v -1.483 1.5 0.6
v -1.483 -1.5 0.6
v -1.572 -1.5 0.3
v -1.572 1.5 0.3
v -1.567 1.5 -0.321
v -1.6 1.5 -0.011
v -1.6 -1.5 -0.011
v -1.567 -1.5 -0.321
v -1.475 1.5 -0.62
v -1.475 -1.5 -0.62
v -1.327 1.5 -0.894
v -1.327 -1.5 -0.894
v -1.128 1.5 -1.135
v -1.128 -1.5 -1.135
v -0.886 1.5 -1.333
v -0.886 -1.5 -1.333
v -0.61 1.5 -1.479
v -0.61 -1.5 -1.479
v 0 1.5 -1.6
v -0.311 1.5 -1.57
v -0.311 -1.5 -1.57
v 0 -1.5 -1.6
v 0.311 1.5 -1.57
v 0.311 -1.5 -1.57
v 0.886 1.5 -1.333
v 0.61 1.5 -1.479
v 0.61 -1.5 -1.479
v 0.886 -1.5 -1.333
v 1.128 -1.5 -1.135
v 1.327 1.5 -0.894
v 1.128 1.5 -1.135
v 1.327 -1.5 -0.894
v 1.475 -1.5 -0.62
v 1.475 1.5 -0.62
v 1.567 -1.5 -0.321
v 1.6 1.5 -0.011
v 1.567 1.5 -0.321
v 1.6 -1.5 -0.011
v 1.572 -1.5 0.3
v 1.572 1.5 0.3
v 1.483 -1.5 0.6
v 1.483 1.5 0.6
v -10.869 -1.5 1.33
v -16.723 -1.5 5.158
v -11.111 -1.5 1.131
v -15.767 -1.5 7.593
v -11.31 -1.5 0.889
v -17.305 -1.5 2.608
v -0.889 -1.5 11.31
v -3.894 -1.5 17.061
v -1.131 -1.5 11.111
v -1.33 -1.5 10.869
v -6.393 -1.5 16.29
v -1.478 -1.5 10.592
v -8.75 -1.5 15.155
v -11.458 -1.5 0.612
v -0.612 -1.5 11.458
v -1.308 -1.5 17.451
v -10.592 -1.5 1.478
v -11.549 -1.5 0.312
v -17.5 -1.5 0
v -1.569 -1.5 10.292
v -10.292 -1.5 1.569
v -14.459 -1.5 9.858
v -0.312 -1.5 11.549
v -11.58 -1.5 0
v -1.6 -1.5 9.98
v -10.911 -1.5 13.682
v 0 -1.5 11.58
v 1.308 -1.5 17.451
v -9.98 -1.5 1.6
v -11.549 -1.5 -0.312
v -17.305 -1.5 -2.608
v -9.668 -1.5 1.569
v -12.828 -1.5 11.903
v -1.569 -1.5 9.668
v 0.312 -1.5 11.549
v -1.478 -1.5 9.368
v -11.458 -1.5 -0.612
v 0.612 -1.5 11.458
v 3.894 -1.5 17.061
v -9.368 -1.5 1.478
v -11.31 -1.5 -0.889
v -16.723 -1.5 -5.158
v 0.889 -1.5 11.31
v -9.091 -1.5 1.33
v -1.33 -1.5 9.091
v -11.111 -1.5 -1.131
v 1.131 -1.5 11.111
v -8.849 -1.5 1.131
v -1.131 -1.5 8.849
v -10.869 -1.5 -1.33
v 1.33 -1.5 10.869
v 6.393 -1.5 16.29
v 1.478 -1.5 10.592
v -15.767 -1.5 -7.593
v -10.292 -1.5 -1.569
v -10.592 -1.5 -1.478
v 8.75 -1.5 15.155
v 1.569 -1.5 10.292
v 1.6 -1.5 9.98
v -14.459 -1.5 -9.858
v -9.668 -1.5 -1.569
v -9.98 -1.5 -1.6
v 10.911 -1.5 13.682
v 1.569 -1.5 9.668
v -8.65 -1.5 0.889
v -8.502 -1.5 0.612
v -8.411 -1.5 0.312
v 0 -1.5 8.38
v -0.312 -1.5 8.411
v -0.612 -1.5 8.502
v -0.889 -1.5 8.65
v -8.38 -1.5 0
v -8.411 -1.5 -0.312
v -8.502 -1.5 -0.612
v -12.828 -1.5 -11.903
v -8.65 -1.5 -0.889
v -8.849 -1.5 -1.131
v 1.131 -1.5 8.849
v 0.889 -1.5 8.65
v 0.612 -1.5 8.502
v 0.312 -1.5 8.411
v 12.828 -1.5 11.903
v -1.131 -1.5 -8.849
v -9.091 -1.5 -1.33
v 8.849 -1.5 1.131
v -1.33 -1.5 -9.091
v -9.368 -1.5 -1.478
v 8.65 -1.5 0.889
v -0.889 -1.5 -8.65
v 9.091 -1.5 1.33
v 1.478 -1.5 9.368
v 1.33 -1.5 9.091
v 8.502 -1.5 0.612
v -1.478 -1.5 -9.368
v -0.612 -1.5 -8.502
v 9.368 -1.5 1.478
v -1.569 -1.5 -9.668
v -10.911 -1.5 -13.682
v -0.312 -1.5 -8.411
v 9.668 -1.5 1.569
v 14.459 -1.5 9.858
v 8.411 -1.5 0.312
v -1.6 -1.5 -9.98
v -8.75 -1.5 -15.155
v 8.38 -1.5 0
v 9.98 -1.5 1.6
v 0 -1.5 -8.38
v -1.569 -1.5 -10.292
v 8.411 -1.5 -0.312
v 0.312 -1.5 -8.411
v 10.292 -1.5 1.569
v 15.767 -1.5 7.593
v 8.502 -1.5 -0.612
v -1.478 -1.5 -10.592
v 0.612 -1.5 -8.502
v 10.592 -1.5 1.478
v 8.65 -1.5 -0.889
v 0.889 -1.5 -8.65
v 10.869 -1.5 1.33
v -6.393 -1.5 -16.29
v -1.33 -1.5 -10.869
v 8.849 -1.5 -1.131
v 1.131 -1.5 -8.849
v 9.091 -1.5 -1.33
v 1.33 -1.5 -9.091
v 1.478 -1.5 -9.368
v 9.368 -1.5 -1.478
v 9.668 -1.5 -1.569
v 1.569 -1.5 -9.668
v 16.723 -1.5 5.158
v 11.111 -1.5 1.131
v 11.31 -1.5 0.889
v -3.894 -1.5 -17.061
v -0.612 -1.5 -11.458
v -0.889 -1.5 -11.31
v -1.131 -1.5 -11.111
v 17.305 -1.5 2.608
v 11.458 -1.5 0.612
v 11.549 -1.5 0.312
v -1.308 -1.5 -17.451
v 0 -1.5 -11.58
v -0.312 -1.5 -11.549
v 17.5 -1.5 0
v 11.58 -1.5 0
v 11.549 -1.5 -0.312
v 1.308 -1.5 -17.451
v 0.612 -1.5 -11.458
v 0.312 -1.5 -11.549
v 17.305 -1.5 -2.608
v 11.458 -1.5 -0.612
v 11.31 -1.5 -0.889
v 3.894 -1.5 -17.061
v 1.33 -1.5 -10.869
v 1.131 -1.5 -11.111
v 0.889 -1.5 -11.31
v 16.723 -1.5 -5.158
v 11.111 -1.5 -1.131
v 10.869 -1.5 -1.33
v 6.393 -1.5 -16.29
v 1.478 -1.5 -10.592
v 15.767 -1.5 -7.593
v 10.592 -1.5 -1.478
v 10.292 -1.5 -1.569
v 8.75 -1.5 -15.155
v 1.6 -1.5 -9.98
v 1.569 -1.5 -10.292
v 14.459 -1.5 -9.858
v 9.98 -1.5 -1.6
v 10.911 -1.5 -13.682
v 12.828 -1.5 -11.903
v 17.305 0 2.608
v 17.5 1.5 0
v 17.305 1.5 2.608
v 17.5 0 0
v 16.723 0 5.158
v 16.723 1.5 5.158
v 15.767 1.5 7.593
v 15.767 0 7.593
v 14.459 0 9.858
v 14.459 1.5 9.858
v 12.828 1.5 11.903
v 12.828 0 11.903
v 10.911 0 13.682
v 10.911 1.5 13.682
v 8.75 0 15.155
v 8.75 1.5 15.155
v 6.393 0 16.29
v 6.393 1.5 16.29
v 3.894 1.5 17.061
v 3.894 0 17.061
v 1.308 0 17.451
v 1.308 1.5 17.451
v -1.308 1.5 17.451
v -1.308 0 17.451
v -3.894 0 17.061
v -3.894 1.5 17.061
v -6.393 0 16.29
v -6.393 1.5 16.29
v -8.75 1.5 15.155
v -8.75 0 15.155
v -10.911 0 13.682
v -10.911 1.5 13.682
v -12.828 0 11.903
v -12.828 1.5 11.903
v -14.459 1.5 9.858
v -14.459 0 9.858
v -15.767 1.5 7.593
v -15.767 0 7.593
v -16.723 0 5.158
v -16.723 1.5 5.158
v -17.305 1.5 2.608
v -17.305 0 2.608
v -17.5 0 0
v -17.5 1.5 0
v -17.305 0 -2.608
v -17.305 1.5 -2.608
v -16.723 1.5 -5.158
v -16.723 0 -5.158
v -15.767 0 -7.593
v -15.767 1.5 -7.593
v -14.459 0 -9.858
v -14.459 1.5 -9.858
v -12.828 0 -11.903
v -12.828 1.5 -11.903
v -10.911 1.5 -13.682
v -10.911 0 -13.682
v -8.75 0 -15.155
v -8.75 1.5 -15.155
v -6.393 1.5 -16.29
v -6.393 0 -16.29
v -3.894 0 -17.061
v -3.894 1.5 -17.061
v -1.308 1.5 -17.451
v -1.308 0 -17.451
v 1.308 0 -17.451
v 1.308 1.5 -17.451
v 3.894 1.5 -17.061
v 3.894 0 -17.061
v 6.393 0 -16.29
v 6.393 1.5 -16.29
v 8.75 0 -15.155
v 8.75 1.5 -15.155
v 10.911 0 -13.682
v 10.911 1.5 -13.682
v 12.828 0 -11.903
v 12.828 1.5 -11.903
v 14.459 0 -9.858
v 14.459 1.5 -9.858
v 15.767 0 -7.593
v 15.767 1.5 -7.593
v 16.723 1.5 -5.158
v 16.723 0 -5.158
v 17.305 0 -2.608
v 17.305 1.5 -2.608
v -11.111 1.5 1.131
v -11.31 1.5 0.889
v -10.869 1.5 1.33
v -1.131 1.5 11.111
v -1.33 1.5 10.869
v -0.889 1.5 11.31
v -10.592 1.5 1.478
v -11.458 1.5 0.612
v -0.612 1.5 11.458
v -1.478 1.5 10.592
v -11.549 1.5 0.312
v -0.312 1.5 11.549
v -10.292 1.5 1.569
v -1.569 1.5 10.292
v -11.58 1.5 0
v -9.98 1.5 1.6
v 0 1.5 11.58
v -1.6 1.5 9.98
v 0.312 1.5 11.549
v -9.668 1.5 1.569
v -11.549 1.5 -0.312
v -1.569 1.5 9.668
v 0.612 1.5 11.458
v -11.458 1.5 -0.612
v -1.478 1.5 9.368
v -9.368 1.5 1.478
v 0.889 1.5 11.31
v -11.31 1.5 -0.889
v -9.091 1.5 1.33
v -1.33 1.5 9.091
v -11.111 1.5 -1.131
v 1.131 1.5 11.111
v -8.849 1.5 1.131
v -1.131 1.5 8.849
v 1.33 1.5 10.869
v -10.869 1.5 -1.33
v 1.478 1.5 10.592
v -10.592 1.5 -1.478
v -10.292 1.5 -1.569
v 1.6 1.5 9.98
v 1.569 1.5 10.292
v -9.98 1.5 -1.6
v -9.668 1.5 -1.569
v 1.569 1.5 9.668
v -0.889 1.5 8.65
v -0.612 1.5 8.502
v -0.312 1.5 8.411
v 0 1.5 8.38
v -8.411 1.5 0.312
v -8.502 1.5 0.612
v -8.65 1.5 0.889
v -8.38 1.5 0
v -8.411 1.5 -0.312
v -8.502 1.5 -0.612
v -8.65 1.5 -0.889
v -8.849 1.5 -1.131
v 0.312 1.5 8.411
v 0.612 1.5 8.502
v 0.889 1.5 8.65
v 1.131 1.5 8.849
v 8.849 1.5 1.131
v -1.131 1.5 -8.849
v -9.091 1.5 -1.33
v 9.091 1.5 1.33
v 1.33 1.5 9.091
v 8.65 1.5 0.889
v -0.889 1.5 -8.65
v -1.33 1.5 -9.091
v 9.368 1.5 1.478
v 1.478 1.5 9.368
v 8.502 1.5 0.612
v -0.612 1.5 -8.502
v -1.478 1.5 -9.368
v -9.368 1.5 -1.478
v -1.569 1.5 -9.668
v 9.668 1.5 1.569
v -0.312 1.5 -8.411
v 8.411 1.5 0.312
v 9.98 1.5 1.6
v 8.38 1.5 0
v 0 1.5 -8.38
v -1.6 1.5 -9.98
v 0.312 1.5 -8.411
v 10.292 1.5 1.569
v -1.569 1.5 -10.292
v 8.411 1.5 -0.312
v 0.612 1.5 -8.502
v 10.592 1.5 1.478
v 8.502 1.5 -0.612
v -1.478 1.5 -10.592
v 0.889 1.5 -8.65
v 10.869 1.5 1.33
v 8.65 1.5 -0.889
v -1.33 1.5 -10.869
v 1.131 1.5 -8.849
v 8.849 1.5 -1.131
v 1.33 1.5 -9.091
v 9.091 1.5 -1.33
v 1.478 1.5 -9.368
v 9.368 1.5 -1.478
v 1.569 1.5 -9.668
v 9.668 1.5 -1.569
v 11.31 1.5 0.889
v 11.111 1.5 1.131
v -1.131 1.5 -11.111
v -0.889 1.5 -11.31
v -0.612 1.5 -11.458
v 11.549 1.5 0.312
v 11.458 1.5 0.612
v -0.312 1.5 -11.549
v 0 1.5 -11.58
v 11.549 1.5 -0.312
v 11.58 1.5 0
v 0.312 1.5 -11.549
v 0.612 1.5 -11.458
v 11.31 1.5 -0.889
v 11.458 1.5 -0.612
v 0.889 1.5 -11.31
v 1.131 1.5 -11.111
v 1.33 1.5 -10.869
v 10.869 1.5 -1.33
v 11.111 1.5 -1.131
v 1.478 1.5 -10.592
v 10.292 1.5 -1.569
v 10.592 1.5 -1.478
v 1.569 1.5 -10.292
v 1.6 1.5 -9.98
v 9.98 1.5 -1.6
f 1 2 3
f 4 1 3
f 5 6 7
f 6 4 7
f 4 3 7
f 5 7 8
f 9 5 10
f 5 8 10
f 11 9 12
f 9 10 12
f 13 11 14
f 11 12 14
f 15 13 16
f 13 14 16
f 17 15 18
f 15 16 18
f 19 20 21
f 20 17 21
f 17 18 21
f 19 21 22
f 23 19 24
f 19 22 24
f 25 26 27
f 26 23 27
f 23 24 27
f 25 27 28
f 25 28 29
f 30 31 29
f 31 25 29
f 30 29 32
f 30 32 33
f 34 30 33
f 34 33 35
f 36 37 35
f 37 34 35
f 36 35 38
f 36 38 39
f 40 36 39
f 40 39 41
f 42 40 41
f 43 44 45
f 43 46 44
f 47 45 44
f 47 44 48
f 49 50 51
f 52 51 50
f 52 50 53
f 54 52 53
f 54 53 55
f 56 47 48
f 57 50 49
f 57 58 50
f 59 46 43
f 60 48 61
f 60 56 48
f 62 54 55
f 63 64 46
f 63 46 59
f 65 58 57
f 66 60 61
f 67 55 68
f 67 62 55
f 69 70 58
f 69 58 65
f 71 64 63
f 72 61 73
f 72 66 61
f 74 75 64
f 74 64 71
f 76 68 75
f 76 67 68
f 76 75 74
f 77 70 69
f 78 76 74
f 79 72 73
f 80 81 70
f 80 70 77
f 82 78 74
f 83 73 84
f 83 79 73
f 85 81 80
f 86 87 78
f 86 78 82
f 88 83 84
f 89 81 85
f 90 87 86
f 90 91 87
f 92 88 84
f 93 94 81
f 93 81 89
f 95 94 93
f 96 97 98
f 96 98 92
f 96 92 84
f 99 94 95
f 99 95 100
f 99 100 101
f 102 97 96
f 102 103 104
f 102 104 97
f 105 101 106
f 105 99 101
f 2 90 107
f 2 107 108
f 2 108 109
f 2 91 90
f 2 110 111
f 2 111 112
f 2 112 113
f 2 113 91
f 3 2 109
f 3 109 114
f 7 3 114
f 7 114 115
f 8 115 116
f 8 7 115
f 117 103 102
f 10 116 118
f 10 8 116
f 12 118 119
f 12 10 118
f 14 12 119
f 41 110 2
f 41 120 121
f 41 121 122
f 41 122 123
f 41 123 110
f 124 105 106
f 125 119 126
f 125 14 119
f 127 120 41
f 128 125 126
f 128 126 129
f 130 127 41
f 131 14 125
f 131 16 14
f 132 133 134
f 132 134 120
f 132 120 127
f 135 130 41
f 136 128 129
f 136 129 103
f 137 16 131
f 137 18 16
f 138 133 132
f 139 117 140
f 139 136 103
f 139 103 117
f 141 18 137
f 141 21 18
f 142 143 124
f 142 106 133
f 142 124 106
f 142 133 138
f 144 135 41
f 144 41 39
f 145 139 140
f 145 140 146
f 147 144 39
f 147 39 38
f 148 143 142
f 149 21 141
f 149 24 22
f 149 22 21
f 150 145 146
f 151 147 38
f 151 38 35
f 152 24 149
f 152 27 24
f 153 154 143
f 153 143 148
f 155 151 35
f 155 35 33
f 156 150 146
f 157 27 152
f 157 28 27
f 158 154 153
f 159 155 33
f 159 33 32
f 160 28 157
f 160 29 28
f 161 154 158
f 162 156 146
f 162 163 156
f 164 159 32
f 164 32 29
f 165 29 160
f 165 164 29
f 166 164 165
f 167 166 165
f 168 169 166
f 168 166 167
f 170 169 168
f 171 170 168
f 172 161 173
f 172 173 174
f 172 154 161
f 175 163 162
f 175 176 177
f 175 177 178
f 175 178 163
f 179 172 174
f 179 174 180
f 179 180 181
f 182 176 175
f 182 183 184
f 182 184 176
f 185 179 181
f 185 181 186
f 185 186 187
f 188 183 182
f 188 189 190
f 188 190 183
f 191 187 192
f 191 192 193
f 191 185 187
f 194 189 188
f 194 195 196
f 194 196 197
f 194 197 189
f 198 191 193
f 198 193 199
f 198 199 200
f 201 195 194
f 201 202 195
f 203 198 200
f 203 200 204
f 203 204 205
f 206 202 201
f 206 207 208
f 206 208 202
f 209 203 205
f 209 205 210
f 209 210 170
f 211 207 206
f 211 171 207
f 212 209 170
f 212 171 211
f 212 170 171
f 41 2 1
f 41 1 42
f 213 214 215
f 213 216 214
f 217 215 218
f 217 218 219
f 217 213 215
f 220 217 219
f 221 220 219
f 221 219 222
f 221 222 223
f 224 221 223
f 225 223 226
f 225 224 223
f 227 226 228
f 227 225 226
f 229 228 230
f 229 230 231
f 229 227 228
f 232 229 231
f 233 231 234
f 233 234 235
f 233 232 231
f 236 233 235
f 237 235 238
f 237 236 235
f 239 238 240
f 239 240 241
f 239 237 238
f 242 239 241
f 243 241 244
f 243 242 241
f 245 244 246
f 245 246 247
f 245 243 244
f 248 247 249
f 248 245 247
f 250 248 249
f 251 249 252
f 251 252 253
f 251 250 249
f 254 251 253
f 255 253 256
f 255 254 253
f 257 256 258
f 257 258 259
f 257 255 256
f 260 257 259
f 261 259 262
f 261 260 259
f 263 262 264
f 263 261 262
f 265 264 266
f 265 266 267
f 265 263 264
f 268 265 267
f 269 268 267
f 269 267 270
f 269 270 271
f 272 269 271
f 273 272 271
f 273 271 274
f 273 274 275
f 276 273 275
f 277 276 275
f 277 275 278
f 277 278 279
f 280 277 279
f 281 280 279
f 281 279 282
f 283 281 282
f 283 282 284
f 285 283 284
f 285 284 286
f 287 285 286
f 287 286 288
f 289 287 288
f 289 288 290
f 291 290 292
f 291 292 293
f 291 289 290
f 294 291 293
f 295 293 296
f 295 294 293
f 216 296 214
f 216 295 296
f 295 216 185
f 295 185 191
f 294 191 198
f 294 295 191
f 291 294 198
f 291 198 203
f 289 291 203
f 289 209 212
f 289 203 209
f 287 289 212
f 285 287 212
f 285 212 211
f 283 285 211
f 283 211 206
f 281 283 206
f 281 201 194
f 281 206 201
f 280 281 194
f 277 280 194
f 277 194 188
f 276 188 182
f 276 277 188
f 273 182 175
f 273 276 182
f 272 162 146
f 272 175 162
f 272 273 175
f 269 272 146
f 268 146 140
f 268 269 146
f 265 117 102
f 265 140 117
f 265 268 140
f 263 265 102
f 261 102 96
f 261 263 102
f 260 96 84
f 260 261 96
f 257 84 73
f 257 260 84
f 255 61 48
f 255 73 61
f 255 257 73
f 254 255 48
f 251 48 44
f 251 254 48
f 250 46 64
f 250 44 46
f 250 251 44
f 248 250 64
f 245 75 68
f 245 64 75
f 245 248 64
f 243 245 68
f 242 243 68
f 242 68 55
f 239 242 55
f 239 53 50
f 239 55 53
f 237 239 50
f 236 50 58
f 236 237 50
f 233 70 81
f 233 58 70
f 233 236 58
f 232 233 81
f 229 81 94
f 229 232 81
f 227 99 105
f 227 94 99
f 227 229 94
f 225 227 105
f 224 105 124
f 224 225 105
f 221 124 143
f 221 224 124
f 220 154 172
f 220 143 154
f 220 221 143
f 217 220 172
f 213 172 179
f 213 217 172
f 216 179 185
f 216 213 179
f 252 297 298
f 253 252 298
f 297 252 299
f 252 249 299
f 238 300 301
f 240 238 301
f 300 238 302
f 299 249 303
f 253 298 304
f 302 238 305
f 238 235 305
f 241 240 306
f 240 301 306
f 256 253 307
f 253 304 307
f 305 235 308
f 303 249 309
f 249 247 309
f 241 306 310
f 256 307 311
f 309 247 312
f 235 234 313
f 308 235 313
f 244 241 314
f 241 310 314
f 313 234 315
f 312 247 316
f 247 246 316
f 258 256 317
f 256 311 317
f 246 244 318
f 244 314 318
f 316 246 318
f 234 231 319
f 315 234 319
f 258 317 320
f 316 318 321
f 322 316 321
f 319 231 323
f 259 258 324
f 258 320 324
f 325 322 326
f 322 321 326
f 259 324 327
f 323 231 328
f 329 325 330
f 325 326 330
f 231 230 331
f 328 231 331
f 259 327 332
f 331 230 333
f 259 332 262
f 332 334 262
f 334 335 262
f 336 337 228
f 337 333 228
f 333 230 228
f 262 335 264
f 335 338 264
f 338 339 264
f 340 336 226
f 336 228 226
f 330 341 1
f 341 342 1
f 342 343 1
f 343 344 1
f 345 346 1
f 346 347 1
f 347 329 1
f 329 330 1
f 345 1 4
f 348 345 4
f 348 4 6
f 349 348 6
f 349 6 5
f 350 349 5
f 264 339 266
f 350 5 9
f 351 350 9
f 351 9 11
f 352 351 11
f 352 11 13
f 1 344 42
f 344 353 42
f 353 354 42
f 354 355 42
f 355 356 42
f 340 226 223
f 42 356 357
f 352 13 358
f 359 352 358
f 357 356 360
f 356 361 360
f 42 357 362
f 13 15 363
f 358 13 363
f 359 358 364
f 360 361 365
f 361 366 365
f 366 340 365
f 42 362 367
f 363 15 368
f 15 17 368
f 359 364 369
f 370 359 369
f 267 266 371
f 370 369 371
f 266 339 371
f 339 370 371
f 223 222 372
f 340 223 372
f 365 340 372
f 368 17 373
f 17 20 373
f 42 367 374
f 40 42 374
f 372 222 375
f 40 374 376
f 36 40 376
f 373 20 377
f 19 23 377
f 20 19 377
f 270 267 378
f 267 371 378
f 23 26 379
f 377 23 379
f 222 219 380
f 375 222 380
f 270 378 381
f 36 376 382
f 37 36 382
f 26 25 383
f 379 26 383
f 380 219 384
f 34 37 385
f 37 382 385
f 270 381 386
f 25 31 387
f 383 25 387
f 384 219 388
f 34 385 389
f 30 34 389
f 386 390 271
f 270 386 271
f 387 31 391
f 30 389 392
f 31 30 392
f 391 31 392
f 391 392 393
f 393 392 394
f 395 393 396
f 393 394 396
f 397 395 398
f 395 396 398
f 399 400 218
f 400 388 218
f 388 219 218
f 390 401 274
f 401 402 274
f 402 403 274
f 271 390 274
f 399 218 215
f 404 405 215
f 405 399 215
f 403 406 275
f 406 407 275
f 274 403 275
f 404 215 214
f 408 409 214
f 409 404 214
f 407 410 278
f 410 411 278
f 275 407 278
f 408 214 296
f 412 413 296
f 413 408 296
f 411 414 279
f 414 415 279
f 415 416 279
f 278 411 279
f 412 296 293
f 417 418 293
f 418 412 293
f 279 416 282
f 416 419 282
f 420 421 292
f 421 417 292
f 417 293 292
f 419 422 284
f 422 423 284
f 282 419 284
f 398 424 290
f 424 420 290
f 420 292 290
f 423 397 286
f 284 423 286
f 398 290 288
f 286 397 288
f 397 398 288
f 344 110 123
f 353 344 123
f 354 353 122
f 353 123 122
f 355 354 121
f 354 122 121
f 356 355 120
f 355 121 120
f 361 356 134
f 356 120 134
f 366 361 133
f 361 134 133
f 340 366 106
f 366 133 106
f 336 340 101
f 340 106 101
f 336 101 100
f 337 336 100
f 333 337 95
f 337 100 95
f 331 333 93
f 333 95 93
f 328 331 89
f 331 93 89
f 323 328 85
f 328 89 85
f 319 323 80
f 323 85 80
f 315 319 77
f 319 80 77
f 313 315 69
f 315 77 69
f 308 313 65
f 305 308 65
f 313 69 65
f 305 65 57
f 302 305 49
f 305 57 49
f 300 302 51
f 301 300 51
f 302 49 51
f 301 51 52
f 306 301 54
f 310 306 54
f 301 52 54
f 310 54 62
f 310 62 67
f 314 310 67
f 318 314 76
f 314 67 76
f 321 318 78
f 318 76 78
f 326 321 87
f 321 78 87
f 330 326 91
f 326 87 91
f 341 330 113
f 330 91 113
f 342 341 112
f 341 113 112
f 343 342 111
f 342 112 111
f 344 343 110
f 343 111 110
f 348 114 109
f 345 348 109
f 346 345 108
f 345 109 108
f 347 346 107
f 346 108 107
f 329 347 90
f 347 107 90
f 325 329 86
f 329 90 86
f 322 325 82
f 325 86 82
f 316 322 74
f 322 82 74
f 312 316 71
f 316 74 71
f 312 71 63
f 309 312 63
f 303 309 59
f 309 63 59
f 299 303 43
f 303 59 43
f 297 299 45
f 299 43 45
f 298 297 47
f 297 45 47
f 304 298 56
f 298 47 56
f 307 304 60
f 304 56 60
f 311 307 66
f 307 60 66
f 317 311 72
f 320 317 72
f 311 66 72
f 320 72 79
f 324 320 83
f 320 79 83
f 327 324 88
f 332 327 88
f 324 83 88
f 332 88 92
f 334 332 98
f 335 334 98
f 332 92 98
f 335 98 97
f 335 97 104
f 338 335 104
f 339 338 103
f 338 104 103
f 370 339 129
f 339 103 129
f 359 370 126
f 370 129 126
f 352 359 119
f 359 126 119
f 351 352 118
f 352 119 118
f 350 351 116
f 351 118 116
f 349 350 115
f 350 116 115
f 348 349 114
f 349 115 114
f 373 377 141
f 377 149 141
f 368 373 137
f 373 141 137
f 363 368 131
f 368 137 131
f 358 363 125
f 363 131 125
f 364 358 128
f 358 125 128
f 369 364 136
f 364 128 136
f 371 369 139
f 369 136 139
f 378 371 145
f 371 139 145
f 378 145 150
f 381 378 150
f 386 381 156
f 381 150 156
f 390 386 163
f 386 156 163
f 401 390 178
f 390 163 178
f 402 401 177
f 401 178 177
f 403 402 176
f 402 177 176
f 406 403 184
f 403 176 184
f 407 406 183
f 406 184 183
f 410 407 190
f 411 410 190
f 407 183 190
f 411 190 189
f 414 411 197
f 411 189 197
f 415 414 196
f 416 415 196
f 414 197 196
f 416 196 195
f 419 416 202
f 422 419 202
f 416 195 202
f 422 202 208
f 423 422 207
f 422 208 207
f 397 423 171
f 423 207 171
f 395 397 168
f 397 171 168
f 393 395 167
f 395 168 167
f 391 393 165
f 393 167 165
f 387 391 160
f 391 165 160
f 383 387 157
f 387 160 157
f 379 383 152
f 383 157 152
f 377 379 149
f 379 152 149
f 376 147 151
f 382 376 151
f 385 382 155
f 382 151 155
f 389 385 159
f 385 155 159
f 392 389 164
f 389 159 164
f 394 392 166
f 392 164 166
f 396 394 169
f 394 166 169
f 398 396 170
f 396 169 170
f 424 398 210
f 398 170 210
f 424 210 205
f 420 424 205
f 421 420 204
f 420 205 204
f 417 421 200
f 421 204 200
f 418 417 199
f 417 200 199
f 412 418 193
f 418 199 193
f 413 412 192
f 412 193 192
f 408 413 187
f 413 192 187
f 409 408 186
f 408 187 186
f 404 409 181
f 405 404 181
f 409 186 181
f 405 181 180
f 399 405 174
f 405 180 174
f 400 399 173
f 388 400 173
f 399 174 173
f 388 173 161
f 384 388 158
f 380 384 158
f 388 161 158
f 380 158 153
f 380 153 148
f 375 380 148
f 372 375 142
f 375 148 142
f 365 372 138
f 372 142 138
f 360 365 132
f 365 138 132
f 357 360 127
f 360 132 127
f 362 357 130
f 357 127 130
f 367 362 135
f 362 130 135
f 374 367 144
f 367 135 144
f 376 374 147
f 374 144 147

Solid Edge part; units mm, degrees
sketch "Sketch1" plane through (0, 0, 0) normal (0, -1, 0) x (1, 0, 0)
  circle A0 centre (0, 0) radius 17.5
extrude "Protrusion1" add sketch "Sketch1" along normal mid plane 3
sketch "Sketch2" plane through (0, -1.5, 0) normal (0, -1, 0) x (1, 0, 0)
  line L0 (-1.4832, 0.6) -> (1.4832, 0.6)
  arc A0 (1.4832, 0.6) -> (-1.4832, 0.6) centre (0, 0) cw
extrude "Cutout1" cut sketch "Sketch2" against normal up to vertex (3 mm away)
hole "Agujero_1" at (0, -1.5, 9.98) direction (0, 1, 0) diameter 3.2 end up to next
pattern_circular "Pattern1" count 4 over 360 about axis through (0, -1.5, 0) along (0, 1, 0) of "Agujero_1"
